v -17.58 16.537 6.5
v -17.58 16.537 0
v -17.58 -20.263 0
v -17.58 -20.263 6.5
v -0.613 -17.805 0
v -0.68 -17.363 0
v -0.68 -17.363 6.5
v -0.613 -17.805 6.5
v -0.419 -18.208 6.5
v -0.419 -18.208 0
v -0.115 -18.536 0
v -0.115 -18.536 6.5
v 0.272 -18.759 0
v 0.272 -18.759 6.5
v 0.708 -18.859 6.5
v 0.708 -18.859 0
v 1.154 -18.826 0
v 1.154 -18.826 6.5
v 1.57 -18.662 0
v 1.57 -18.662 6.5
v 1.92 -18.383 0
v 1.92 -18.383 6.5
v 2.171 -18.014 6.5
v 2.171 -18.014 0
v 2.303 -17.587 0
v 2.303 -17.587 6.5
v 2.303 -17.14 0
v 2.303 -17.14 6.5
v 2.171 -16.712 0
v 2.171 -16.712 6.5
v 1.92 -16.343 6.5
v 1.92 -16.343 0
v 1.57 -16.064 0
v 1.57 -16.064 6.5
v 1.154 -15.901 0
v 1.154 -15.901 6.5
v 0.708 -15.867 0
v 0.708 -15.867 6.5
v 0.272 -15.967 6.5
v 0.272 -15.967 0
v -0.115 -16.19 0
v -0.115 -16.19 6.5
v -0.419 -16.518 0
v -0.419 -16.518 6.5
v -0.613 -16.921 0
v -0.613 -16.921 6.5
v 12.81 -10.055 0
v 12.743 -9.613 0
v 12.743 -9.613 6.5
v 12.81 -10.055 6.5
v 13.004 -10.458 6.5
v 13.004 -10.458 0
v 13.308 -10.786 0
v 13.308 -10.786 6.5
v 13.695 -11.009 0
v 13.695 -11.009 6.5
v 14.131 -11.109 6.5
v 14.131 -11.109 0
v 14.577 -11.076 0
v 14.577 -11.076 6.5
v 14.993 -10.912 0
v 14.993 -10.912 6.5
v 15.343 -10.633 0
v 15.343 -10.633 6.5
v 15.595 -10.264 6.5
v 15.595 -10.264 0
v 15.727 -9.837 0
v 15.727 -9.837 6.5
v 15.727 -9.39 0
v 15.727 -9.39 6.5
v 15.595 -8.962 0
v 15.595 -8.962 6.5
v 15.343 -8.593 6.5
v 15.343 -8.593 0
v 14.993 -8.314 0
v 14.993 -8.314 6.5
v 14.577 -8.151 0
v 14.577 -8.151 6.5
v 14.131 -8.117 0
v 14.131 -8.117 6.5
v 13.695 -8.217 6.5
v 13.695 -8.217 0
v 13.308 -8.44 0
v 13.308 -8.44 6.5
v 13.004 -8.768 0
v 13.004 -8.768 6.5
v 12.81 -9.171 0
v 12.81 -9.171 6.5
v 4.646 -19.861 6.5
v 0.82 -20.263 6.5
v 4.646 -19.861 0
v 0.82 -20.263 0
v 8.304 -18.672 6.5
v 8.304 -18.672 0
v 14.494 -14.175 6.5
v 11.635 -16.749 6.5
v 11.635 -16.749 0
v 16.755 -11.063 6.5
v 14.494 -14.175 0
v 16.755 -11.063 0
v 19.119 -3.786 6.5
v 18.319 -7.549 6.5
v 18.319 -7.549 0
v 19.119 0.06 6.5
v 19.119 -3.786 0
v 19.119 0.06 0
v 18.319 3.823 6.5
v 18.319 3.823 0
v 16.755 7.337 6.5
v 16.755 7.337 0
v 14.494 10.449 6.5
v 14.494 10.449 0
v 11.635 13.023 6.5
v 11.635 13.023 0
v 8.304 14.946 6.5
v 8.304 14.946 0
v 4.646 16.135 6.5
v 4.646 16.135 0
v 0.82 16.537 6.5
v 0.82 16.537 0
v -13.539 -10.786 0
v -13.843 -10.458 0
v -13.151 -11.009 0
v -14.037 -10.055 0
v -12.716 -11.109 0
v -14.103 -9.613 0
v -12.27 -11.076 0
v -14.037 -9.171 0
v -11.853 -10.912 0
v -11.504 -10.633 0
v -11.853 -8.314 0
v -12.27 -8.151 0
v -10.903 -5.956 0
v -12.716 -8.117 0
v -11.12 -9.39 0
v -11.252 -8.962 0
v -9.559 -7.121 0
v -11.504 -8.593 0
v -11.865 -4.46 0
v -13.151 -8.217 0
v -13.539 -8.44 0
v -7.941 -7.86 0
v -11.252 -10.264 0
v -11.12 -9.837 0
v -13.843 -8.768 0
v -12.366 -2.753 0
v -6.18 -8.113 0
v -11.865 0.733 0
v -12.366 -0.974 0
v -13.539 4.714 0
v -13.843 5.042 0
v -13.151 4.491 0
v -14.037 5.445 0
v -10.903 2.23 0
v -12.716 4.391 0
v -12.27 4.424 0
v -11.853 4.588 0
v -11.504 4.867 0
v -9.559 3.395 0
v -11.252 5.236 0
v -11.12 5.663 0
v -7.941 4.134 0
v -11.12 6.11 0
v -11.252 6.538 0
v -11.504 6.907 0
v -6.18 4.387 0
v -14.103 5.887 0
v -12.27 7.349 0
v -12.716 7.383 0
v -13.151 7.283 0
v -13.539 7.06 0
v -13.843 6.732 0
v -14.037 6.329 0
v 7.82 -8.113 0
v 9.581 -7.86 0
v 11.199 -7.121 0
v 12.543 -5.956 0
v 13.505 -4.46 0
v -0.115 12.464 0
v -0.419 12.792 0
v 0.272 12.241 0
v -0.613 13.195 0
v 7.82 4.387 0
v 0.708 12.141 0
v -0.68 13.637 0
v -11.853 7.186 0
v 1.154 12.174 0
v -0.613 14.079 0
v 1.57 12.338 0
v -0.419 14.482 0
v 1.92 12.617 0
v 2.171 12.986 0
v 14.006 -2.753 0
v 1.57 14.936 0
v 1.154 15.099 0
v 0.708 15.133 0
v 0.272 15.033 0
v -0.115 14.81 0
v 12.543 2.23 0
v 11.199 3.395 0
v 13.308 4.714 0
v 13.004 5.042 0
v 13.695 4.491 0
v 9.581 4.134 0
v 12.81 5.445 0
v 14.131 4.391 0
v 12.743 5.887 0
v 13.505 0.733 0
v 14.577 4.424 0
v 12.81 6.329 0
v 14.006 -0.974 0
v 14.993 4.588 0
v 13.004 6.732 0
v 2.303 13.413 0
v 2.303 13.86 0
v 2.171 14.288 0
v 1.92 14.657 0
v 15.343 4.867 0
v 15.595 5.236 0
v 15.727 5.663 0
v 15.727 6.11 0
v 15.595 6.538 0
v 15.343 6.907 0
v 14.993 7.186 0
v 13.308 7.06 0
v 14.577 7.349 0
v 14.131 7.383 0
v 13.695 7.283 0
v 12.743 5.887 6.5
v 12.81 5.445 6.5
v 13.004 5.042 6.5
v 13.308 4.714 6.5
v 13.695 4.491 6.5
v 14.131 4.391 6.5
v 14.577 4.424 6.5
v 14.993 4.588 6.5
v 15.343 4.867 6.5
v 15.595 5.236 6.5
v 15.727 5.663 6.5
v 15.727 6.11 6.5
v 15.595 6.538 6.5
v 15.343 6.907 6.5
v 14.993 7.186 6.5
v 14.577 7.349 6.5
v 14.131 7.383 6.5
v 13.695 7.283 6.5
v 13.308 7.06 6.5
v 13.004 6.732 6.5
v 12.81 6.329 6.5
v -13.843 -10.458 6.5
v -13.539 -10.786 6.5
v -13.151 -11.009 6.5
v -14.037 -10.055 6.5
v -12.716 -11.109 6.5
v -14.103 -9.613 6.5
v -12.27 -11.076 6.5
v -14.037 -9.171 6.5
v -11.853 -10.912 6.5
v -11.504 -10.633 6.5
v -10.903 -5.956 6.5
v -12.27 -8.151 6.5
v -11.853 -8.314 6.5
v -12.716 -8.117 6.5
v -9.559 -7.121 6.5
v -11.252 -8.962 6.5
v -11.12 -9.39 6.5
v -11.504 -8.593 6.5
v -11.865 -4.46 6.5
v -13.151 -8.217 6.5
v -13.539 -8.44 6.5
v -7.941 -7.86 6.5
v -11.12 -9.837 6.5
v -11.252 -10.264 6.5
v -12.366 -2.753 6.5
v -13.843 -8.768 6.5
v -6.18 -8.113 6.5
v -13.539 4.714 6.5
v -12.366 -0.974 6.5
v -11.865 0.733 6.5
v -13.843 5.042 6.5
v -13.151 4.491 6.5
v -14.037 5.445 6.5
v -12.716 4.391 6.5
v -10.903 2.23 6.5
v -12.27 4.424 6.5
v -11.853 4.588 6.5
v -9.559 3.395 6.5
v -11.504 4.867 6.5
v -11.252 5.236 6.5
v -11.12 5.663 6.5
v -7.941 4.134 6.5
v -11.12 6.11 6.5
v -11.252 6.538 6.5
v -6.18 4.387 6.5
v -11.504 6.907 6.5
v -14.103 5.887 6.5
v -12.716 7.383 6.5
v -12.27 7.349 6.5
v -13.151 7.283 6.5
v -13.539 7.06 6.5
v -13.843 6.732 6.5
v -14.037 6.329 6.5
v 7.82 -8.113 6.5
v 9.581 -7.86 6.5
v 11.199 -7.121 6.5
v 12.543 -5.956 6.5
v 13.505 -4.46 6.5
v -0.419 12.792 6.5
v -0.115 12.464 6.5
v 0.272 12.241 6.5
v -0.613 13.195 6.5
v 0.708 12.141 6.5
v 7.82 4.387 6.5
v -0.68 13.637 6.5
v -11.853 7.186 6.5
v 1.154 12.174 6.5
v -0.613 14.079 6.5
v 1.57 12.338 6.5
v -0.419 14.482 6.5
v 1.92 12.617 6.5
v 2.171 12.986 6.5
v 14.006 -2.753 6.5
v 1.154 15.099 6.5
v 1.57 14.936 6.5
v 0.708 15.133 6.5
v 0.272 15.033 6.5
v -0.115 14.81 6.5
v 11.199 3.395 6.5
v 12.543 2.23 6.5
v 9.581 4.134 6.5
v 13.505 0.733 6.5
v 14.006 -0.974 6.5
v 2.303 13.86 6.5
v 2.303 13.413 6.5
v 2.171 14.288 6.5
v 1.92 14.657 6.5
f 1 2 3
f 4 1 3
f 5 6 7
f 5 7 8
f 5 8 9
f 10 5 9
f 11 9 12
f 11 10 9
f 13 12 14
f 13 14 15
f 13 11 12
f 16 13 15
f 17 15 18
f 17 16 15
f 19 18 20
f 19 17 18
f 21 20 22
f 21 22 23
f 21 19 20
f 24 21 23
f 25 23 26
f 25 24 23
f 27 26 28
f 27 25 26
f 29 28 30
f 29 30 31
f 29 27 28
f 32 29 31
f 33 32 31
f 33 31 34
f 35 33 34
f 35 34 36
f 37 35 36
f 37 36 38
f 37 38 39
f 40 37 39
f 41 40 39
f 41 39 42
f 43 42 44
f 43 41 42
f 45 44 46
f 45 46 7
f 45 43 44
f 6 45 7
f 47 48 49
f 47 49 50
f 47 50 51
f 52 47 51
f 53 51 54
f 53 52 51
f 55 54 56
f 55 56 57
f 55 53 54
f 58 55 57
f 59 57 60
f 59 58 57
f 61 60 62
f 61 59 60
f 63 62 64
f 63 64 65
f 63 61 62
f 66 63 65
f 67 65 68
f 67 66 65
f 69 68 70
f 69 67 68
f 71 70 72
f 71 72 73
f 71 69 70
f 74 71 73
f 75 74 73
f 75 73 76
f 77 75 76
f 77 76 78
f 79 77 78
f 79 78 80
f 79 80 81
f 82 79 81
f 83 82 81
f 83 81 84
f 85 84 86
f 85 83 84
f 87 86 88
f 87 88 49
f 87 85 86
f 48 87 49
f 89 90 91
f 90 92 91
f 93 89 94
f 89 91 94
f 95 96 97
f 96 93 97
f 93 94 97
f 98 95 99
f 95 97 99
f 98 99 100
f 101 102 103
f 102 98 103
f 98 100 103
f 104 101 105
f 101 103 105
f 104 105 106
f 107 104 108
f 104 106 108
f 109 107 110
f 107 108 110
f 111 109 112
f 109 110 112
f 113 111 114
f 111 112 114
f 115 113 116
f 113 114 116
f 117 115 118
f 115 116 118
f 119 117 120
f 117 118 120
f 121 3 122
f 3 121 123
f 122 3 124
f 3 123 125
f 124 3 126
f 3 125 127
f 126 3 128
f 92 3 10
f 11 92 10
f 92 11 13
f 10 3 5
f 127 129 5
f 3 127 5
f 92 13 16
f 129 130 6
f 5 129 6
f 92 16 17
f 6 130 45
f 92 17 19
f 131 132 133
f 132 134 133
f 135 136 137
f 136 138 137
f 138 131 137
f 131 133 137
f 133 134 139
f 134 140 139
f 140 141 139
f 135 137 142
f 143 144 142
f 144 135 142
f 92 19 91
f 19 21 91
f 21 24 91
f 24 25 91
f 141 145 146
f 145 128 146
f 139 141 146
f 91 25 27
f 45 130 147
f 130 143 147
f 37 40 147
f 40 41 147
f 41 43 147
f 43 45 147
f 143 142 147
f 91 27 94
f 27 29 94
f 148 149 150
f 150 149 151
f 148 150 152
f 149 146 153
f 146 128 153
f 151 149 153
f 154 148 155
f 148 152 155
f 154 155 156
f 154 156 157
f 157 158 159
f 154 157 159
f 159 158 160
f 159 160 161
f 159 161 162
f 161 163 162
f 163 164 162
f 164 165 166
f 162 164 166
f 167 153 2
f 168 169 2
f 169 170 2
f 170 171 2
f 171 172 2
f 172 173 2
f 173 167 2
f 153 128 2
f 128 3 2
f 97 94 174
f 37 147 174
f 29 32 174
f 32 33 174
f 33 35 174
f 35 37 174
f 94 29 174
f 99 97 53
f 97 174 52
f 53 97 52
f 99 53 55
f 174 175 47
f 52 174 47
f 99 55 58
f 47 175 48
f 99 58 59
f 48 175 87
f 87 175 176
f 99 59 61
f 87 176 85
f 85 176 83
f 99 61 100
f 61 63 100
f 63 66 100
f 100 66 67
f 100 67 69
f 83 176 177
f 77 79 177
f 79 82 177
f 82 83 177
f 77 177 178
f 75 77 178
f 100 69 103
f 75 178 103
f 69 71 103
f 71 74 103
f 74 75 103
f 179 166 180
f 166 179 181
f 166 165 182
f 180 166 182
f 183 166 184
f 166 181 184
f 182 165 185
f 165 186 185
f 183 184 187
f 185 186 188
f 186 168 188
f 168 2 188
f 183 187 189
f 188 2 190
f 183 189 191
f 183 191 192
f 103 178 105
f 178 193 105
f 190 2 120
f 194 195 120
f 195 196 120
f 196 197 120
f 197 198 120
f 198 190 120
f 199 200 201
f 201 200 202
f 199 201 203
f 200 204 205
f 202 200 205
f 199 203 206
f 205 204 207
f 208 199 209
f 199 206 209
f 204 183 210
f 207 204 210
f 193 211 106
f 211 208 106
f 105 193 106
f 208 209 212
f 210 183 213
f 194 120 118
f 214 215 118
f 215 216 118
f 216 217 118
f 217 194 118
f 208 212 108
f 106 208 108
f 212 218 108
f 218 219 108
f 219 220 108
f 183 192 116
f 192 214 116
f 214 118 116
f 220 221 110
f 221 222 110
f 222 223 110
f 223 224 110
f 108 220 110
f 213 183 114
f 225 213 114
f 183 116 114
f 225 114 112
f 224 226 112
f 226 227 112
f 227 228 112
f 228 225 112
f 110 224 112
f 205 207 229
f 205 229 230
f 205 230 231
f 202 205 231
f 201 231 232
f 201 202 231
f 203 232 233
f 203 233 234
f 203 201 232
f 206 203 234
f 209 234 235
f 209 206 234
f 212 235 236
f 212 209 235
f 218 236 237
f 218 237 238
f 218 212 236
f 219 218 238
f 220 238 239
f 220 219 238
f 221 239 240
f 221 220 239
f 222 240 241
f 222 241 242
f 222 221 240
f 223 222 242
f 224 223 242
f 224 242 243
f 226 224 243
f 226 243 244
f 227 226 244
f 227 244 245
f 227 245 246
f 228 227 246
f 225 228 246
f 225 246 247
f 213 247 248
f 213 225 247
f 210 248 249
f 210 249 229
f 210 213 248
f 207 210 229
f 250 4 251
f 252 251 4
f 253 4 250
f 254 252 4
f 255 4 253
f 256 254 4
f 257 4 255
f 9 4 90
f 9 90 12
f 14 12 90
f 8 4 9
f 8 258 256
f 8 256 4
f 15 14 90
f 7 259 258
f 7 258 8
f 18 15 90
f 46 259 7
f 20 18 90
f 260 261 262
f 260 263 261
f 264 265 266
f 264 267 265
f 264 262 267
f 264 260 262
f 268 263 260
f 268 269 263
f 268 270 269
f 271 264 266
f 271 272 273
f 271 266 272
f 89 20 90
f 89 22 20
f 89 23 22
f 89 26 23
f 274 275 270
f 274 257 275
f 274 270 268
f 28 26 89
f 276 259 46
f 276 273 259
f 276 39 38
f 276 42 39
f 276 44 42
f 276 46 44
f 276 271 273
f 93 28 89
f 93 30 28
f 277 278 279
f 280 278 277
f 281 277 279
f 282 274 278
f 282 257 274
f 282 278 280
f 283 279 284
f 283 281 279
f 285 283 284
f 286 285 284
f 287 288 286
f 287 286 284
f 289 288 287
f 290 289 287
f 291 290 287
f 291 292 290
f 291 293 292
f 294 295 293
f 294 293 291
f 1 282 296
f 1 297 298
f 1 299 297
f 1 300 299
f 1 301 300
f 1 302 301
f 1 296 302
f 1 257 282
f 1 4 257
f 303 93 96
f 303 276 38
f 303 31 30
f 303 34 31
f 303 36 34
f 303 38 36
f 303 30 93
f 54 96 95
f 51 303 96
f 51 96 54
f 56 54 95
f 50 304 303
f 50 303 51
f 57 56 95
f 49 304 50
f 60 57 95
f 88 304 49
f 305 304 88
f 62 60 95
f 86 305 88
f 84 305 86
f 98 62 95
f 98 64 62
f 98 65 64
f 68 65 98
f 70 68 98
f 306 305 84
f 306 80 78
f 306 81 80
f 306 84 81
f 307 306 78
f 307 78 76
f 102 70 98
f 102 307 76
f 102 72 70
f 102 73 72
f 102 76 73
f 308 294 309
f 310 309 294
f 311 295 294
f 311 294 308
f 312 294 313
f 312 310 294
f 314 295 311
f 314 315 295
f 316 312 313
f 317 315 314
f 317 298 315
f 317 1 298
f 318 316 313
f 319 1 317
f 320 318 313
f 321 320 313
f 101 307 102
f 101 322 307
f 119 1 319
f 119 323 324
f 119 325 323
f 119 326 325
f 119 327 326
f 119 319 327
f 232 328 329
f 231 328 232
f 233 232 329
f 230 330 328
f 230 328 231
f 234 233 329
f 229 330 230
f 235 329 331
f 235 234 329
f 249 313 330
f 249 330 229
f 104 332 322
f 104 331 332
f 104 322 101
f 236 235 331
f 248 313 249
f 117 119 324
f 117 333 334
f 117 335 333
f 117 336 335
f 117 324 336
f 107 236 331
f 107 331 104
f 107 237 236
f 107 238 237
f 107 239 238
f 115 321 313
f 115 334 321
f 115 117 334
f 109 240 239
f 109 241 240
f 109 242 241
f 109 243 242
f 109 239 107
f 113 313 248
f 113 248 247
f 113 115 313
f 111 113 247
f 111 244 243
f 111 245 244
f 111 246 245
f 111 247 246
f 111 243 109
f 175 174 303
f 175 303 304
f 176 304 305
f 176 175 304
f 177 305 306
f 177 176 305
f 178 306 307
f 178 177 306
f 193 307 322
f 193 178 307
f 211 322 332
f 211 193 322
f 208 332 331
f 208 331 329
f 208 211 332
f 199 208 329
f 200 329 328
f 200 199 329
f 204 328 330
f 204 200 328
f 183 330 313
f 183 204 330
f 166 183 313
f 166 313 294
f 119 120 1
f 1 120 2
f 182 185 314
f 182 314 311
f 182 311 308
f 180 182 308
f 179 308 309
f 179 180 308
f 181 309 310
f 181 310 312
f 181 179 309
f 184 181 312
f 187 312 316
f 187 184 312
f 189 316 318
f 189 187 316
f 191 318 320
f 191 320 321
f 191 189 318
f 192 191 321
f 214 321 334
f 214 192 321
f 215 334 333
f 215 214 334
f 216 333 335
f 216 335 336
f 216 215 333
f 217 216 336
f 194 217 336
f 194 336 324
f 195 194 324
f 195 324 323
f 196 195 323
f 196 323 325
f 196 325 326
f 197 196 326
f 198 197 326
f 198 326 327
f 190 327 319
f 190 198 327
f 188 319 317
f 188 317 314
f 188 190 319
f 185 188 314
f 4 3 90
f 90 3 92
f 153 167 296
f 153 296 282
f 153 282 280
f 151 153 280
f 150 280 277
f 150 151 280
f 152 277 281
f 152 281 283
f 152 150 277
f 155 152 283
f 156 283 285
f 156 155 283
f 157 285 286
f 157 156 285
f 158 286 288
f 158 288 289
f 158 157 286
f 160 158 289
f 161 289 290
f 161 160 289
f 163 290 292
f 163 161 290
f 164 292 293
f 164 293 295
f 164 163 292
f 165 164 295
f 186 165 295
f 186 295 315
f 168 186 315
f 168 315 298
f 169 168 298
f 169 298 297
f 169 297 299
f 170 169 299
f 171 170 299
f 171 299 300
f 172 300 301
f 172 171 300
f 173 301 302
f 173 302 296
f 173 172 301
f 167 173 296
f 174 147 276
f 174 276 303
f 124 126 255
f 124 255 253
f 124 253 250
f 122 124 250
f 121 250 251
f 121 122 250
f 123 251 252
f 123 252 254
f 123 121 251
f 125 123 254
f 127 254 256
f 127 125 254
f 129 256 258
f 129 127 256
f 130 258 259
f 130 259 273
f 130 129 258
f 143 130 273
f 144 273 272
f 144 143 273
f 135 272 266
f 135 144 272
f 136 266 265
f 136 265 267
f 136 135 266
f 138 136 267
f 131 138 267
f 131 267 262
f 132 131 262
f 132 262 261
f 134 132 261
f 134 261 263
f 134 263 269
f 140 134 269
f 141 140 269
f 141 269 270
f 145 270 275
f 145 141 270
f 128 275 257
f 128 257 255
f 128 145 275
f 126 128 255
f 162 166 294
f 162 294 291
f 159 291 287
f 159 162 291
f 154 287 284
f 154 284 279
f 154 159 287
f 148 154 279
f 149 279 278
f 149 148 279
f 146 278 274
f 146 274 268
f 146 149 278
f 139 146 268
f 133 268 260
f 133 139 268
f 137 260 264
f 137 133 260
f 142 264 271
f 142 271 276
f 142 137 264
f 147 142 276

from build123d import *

# Parameters (mm, degrees)
SKETCH_1_R      = 1.5
EXTRUDE_1_DEPTH = 6.5


with BuildPart() as part:
    # 草图1 → 凸台-拉伸1 (new body)
    with BuildSketch(Plane.XY):
        with BuildLine():
            Line((0.819984335, 16.536837123), (-17.580015665, 16.536837123))
            Line((-17.580015665, 16.536837123), (-17.580015665, -20.263162877))
            Line((-17.580015665, -20.263162877), (0.819984335, -20.263162877))
            ThreePointArc((0.819984335, -20.263162877), (19.219984335, -1.863162877), (0.819984335, 16.536837123))
        make_face()
        with Locations((-12.603409424, -9.613162877)):
            Circle(SKETCH_1_R, mode=Mode.SUBTRACT)
        with Locations((0.819984335, -17.363162877)):
            Circle(SKETCH_1_R, mode=Mode.SUBTRACT)
        with Locations((14.243378094, -9.613162877)):
            Circle(SKETCH_1_R, mode=Mode.SUBTRACT)
        with Locations((-12.603409424, 5.886837123)):
            Circle(SKETCH_1_R, mode=Mode.SUBTRACT)
        with BuildLine():
            ThreePointArc((7.819984335, 4.386837123), (14.069984335, -1.863162877), (7.819984335, -8.113162877))
            Line((7.819984335, -8.113162877), (-6.180015665, -8.113162877))
            ThreePointArc((-6.180015665, -8.113162877), (-12.430015665, -1.863162877), (-6.180015665, 4.386837123))
            Line((-6.180015665, 4.386837123), (7.819984335, 4.386837123))
        make_face(mode=Mode.SUBTRACT)
        with Locations((14.243378094, 5.886837123)):
            Circle(SKETCH_1_R, mode=Mode.SUBTRACT)
        with Locations((0.819984335, 13.636837123)):
            Circle(SKETCH_1_R, mode=Mode.SUBTRACT)
    extrude(amount=EXTRUDE_1_DEPTH)


solid = part.part
